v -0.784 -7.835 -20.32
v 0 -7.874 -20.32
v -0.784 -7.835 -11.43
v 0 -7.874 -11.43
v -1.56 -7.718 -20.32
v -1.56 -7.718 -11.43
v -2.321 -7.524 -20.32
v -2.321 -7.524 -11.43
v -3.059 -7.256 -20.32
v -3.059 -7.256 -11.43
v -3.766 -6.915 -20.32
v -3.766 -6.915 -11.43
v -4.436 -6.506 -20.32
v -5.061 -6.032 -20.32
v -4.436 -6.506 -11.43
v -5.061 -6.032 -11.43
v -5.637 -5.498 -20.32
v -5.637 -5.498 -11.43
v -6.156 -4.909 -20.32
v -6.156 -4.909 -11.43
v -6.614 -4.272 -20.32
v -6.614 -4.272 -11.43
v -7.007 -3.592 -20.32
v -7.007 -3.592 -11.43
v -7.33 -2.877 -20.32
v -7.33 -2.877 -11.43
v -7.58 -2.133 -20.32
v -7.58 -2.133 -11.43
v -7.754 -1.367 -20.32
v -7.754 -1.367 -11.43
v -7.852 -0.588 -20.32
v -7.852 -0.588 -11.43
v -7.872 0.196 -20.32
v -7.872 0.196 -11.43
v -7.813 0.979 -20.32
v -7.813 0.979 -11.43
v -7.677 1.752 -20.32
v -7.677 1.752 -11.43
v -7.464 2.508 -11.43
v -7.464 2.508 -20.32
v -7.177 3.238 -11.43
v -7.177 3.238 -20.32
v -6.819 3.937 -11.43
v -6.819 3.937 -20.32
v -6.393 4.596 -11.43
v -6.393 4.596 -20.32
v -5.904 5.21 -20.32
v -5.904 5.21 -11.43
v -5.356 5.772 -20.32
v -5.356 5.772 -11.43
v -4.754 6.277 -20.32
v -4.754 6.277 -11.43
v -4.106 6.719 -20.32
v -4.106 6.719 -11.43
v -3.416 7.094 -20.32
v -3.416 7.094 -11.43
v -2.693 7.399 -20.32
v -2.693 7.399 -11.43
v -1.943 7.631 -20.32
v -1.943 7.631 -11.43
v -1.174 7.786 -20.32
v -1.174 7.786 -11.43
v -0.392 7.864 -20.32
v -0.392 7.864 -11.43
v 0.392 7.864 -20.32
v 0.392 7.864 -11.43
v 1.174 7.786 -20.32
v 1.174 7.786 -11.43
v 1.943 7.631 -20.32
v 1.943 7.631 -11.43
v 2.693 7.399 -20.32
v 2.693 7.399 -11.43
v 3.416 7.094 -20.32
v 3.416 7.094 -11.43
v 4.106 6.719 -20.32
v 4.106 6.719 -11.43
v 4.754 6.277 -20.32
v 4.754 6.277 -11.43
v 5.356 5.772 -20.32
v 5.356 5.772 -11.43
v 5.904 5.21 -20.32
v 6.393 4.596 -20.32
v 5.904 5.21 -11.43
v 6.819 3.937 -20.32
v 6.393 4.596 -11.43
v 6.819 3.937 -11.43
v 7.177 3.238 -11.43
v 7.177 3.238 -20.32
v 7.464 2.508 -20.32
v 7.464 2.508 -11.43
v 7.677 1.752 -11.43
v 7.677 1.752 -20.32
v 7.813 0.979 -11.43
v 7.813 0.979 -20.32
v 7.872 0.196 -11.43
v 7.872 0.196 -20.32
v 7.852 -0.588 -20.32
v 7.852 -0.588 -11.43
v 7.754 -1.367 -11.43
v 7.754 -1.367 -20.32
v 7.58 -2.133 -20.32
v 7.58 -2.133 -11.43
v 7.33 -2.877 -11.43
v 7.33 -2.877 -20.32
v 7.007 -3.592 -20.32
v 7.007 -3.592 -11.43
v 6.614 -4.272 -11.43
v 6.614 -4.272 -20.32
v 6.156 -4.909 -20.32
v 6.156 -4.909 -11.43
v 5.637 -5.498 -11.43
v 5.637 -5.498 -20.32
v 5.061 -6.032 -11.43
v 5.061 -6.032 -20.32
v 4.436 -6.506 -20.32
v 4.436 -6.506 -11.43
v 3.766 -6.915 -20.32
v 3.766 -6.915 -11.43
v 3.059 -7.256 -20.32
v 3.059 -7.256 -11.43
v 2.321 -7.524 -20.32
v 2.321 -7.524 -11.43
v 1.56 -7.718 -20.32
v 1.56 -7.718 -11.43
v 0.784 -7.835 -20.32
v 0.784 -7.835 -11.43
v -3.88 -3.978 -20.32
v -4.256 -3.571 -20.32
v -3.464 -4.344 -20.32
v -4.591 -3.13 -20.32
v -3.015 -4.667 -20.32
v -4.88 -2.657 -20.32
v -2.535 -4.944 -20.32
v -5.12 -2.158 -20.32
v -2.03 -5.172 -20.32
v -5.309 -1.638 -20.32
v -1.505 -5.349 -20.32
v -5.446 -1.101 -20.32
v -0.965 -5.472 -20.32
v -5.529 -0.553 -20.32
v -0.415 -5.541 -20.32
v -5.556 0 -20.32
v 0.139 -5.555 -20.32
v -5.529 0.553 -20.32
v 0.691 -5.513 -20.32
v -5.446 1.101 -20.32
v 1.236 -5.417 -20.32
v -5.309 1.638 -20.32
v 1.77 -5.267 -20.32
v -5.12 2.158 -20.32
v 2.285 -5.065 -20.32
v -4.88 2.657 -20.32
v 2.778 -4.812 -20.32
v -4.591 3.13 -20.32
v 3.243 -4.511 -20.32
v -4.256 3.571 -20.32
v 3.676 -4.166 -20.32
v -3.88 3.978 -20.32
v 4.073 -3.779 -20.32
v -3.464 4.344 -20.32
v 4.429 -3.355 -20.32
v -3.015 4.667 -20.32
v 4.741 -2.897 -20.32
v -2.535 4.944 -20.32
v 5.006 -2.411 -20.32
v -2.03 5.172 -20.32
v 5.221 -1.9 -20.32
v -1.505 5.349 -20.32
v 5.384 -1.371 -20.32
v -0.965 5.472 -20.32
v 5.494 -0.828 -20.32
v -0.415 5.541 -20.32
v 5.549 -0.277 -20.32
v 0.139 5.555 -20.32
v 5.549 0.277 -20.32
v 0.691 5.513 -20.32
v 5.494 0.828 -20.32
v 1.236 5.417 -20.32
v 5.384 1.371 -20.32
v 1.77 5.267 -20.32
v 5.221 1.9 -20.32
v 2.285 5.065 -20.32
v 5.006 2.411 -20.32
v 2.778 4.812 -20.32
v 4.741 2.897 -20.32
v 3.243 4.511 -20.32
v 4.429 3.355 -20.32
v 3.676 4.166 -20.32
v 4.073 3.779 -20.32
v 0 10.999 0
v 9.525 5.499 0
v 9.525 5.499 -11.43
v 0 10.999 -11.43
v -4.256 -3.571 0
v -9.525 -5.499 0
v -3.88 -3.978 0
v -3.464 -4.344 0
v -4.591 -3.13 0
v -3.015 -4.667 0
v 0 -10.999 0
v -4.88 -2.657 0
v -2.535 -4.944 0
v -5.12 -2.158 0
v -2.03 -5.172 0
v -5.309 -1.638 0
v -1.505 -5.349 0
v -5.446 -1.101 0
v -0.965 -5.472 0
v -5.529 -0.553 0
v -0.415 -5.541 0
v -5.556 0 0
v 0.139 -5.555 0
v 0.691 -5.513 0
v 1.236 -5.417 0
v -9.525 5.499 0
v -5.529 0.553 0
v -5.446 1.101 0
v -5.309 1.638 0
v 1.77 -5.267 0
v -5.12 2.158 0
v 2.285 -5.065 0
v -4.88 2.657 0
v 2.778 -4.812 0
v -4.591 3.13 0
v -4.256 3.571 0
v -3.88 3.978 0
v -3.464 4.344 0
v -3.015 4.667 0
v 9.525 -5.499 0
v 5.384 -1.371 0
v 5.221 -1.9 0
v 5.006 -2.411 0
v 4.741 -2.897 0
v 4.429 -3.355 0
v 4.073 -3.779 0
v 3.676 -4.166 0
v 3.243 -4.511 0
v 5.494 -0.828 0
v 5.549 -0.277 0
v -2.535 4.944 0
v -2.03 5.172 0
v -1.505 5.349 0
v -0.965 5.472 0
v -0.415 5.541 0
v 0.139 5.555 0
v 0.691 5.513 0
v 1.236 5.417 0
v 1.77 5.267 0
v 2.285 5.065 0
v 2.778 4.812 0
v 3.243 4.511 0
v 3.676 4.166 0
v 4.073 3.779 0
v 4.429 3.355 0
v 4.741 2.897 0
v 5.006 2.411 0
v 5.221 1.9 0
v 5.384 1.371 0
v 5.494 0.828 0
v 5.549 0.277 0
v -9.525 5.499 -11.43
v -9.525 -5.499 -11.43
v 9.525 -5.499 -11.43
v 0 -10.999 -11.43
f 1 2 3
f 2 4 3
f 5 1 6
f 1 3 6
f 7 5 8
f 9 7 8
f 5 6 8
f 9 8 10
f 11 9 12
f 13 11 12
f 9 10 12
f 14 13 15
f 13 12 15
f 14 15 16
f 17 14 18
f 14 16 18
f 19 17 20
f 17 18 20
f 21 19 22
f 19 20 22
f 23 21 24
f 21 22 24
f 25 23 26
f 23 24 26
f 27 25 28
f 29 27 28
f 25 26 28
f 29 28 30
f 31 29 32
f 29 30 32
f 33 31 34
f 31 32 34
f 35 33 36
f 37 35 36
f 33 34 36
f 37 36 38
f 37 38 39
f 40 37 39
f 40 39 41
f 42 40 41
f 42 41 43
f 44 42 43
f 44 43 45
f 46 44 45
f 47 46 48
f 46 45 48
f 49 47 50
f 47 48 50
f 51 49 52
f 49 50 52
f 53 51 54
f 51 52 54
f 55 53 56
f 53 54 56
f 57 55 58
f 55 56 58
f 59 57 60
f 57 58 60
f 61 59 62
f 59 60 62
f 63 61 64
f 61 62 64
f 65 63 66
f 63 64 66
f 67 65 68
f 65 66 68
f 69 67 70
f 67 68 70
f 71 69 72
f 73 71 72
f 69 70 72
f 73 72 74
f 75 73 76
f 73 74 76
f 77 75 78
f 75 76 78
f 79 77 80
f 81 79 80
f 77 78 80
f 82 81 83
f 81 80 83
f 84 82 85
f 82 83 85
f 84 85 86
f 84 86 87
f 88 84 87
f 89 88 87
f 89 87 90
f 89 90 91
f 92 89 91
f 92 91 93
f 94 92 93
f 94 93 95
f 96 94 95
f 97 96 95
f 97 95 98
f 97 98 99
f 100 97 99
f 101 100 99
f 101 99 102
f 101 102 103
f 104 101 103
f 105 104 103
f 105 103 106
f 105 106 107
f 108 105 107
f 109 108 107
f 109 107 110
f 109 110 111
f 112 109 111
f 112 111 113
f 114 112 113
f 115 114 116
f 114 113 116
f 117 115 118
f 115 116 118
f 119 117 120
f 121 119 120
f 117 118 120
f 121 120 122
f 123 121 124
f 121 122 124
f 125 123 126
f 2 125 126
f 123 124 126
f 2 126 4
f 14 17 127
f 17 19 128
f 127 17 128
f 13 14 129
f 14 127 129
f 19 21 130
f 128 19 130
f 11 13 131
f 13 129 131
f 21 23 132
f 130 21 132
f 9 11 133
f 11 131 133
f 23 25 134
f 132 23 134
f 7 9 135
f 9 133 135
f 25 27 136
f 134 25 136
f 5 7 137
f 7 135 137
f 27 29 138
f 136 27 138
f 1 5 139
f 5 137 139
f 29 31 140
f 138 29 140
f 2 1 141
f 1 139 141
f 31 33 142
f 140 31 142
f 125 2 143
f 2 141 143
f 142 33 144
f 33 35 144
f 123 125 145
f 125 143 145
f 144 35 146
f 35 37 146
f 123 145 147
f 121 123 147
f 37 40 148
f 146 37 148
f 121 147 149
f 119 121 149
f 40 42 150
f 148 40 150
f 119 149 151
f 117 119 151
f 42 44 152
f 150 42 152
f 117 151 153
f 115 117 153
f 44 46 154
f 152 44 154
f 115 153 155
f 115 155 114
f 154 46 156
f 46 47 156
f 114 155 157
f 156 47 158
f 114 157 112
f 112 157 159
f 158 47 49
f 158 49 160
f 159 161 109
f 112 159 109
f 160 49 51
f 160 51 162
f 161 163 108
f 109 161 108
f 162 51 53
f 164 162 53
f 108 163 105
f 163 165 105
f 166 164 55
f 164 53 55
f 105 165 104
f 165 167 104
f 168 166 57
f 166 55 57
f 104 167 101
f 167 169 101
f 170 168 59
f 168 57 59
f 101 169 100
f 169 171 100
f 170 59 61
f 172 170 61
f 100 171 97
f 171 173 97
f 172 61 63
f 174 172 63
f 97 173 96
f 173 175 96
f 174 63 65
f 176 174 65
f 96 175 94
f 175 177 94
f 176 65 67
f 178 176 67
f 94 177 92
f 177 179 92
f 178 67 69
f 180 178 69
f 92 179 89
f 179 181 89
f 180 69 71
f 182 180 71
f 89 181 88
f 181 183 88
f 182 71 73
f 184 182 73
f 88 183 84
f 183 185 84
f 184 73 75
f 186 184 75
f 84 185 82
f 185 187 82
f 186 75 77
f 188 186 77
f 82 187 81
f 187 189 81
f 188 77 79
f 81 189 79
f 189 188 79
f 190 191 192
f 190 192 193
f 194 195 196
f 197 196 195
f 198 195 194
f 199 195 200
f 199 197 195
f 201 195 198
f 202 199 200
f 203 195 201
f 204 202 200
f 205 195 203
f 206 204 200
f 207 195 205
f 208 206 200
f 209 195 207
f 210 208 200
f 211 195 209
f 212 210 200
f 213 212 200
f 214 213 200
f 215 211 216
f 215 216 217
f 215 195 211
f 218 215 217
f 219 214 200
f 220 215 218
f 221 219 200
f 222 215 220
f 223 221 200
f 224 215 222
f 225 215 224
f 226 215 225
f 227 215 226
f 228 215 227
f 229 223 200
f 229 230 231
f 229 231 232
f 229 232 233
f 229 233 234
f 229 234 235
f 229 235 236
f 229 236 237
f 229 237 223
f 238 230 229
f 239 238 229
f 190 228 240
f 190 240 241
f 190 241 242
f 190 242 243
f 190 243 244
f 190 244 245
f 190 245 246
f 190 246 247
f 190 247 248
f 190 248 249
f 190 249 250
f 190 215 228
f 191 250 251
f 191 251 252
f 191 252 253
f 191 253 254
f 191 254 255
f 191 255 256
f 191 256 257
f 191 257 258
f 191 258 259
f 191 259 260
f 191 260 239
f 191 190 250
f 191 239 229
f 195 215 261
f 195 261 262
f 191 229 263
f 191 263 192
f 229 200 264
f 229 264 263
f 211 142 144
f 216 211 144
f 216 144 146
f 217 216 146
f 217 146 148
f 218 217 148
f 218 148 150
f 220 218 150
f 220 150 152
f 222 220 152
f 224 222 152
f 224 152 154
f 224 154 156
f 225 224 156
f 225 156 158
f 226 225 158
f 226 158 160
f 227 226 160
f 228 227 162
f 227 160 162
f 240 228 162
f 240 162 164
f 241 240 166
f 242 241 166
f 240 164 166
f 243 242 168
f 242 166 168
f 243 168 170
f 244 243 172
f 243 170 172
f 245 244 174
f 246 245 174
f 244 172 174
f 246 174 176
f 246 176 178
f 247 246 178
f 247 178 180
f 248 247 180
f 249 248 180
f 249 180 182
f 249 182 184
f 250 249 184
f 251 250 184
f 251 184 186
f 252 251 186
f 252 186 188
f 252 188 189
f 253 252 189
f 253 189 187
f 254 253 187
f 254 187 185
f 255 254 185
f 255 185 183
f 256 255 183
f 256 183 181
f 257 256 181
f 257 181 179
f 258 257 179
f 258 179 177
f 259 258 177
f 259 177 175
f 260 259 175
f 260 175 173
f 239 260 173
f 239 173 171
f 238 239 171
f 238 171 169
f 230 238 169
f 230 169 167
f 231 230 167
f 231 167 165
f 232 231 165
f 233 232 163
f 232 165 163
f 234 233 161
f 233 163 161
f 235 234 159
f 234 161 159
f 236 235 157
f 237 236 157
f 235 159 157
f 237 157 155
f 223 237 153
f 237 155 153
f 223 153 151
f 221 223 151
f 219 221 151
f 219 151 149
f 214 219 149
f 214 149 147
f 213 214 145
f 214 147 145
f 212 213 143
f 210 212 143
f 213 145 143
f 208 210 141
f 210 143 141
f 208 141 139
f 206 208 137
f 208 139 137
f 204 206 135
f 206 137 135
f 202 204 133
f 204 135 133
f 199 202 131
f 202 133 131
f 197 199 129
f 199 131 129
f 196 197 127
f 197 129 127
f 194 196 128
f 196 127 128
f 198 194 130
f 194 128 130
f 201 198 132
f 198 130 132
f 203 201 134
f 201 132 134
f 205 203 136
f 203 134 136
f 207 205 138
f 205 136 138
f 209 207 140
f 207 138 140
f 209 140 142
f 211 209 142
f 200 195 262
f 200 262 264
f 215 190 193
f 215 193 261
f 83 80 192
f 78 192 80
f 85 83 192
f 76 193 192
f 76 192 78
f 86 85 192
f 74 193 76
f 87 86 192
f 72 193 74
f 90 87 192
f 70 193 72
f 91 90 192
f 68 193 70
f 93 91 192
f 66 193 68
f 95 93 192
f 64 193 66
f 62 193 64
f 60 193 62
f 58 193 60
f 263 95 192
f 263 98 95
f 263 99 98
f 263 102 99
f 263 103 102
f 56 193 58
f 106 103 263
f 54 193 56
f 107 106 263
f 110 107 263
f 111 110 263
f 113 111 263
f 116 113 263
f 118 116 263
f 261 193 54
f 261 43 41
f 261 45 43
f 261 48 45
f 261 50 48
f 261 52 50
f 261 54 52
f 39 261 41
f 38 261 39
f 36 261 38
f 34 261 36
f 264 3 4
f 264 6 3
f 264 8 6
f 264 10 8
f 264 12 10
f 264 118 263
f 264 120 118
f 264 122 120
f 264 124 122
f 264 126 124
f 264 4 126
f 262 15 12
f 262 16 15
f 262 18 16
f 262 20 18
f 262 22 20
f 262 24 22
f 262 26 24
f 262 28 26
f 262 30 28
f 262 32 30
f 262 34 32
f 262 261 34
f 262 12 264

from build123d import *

# Parameters (mm, degrees)
F1_DEPTH = 20.32
F2_W     = 3.1245226281
F2_H     = 8.89
F6_D     = 11.1125


with BuildPart() as f1:
    # F0 (on Top) → F1 (new body)
    with BuildSketch(Plane.XY):
        Polygon((-9.525, 5.499261314), (-9.525, -5.499261314), (0, -10.9985226281), (9.525, -5.499261314), (9.525, 5.499261314), (0, 10.9985226281), align=None)
    extrude(amount=-F1_DEPTH)

    # F2 (on Right) → F4 (revolve, cut)
    with BuildSketch(Plane.YZ):
        with Locations((-9.436261314, -15.875)):
            Rectangle(F2_W, F2_H)
    revolve(axis=Axis((0, 0, -8.0978884362), (0, 0, -1)), mode=Mode.SUBTRACT)

    # F6 (through all)
    with Locations(Plane.XY):
        with Locations((0, 0)):
            Hole(F6_D / 2)


solid = f1.part
